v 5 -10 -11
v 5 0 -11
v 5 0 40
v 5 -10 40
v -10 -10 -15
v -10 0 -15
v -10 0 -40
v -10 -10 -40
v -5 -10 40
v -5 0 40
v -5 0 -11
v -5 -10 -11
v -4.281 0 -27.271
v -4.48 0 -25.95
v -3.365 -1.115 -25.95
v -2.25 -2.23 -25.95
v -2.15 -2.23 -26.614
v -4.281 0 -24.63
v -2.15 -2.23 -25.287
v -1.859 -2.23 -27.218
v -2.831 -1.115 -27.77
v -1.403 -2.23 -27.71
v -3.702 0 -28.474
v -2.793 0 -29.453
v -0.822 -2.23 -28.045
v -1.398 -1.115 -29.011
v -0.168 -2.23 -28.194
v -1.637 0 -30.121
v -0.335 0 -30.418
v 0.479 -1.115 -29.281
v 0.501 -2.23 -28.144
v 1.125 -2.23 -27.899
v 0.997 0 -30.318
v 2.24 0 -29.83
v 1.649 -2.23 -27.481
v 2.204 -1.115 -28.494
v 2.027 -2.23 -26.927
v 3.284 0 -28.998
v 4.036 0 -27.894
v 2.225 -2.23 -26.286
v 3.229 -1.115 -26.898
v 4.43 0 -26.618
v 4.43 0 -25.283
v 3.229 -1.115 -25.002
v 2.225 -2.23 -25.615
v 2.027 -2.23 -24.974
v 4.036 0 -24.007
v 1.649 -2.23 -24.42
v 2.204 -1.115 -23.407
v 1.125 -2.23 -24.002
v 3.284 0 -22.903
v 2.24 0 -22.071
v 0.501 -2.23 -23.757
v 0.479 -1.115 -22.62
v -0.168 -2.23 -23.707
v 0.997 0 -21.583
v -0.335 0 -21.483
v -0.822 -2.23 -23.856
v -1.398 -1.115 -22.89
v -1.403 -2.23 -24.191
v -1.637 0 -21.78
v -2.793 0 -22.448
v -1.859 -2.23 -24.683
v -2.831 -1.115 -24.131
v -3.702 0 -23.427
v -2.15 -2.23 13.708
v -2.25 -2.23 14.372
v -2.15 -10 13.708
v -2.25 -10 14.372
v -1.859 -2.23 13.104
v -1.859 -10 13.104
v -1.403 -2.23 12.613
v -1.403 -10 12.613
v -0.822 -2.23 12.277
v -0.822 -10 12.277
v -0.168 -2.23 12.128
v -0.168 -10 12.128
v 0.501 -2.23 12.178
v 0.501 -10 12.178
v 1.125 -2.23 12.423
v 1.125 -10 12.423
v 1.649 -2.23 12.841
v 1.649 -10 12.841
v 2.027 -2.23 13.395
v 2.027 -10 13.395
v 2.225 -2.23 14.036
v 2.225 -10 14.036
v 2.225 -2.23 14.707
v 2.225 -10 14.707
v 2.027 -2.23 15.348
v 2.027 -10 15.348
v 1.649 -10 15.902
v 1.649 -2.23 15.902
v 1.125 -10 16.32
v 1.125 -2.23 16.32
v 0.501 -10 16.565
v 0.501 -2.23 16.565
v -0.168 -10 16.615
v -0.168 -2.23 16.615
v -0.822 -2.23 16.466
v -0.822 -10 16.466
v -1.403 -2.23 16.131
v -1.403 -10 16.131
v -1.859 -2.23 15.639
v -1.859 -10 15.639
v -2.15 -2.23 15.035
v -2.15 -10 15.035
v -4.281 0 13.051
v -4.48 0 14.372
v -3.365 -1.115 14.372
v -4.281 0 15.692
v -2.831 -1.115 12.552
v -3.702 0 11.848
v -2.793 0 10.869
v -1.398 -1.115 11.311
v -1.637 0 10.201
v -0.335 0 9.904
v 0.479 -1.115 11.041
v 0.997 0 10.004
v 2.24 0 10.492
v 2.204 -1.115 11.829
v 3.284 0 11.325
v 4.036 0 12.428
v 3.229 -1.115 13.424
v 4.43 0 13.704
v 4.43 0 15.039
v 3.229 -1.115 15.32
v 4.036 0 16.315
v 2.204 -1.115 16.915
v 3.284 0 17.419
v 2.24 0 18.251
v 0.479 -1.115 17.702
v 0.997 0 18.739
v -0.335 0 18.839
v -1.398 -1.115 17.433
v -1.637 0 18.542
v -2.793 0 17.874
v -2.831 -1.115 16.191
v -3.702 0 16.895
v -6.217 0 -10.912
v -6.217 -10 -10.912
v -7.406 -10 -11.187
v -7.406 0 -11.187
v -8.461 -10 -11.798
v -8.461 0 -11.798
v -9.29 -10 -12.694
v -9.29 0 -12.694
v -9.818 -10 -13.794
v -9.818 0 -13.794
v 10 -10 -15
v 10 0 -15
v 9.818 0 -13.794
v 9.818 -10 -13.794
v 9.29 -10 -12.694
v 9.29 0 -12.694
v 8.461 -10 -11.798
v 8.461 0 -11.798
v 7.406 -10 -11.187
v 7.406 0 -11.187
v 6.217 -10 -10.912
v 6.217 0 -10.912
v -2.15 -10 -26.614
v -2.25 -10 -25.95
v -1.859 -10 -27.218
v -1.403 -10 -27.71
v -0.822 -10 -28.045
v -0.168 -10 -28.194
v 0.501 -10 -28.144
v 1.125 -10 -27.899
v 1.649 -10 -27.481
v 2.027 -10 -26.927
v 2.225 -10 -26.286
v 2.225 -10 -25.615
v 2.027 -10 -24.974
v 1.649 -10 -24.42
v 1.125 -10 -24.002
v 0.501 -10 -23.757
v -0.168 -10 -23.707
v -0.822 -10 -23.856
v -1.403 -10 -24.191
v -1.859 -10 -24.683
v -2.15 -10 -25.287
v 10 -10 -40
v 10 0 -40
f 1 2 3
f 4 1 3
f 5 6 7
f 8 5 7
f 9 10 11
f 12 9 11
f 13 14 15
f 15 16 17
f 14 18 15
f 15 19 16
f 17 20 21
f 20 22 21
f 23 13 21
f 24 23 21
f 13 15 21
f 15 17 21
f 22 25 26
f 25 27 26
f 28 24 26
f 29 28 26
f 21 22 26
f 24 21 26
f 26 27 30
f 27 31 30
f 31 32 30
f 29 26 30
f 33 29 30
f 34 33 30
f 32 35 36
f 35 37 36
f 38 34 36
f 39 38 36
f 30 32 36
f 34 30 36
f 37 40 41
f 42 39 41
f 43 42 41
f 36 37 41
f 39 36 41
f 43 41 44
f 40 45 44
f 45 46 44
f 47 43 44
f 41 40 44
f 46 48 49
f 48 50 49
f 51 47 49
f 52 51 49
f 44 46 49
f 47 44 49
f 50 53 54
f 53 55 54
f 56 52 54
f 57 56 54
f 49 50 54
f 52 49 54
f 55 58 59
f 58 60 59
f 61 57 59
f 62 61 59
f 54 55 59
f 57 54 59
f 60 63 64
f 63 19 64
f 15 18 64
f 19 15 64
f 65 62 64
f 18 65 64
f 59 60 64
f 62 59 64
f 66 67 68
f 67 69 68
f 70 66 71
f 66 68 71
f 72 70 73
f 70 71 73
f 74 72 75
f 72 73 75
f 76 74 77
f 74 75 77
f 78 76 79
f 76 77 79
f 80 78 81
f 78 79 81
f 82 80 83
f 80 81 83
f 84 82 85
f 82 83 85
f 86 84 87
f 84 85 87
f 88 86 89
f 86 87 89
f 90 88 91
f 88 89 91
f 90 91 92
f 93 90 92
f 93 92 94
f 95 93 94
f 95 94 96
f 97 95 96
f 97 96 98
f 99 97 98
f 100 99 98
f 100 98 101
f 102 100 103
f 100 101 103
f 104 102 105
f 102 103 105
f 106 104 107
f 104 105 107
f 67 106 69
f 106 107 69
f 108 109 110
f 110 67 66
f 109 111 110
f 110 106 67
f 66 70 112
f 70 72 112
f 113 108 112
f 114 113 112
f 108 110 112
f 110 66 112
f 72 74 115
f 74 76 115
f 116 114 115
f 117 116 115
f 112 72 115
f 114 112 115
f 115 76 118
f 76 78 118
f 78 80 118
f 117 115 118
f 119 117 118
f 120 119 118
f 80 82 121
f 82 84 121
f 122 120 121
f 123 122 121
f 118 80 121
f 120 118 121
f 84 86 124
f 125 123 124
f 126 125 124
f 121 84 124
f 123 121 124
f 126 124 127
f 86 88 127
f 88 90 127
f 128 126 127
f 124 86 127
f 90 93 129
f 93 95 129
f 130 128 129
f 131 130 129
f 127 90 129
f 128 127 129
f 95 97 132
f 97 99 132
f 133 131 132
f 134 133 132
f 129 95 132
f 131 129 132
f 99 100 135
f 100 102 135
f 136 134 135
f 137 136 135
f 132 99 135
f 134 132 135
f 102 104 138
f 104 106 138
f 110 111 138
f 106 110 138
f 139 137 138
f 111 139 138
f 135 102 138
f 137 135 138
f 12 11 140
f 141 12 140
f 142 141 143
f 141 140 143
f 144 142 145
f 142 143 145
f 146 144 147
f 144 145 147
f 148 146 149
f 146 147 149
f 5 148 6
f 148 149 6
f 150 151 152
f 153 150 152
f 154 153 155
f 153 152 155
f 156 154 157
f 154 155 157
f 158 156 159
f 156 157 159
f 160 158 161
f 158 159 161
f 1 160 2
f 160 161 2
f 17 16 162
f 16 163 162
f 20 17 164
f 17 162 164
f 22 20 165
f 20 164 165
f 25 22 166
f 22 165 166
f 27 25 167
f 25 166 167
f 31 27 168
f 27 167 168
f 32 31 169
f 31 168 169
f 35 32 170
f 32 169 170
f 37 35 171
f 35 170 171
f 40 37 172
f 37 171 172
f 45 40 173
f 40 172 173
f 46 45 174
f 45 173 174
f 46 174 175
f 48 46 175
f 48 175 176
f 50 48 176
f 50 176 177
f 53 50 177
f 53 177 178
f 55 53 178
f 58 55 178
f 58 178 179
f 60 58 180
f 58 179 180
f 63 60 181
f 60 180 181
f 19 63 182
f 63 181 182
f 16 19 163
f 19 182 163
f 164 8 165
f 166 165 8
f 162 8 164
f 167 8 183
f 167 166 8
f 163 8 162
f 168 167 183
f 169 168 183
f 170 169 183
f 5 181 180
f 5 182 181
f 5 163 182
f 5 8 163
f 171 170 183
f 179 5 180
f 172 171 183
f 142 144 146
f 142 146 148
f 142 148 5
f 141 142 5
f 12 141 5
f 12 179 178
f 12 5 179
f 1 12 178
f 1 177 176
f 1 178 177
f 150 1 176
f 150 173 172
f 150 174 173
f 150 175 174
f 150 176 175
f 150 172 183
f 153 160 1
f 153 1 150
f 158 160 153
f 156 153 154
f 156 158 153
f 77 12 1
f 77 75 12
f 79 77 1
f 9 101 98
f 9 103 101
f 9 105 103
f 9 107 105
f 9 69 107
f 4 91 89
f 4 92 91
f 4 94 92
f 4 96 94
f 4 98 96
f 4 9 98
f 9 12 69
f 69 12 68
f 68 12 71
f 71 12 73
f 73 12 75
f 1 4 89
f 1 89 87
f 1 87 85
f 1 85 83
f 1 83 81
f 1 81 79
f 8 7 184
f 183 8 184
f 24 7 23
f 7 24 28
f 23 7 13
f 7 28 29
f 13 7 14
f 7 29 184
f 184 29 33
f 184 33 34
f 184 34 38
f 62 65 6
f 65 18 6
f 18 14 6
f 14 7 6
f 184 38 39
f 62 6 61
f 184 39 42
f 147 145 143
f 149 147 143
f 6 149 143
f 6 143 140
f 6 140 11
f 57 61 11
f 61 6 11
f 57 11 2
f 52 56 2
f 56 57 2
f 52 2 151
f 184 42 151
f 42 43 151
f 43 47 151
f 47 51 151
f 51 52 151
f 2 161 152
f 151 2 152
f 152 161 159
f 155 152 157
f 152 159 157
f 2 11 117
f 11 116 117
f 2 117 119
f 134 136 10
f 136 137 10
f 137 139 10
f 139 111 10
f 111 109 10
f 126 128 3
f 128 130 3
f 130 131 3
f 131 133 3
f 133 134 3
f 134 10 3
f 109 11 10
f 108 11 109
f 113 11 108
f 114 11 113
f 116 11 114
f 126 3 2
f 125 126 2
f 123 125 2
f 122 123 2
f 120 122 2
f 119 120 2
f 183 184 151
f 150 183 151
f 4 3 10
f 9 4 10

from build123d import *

# Parameters (mm, degrees)
F1_DEPTH       = 10
F2_D           = 4.5
F2_CSINK_D     = 8.96
F2_CSINK_ANGLE = 90


with BuildPart() as f1:
    # F0 (on Front) → F1 (new body)
    with BuildSketch(Plane.XZ):
        Polygon((5, -11), (5, 40), (-5, 40), (-5, -11), (-5, -40), (5, -40), (5, -15), align=None)
        with BuildLine():
            ThreePointArc((10, -15), (8.461249695, -11.7984378813), (5, -11))
            Line((5, -11), (5, -15))
            Line((5, -15), (5, -40))
            Line((5, -40), (10, -40))
            Line((10, -40), (10, -15))
        make_face()
        with BuildLine():
            Line((-5, -40), (-5, -11))
            ThreePointArc((-5, -11), (-8.461249695, -11.7984378813), (-10, -15))
            Line((-10, -15), (-10, -40))
            Line((-10, -40), (-5, -40))
        make_face()
    extrude(amount=F1_DEPTH)

    # F2 (through all)
    with Locations(Plane(origin=(0, 0, 0), x_dir=(1, 0, 0), z_dir=(0, 1, 0))):
        with Locations((0, -14.3716754392), (0, 25.9504150599)):
            CounterSinkHole(F2_D / 2, F2_CSINK_D / 2, counter_sink_angle=F2_CSINK_ANGLE)


solid = f1.part
